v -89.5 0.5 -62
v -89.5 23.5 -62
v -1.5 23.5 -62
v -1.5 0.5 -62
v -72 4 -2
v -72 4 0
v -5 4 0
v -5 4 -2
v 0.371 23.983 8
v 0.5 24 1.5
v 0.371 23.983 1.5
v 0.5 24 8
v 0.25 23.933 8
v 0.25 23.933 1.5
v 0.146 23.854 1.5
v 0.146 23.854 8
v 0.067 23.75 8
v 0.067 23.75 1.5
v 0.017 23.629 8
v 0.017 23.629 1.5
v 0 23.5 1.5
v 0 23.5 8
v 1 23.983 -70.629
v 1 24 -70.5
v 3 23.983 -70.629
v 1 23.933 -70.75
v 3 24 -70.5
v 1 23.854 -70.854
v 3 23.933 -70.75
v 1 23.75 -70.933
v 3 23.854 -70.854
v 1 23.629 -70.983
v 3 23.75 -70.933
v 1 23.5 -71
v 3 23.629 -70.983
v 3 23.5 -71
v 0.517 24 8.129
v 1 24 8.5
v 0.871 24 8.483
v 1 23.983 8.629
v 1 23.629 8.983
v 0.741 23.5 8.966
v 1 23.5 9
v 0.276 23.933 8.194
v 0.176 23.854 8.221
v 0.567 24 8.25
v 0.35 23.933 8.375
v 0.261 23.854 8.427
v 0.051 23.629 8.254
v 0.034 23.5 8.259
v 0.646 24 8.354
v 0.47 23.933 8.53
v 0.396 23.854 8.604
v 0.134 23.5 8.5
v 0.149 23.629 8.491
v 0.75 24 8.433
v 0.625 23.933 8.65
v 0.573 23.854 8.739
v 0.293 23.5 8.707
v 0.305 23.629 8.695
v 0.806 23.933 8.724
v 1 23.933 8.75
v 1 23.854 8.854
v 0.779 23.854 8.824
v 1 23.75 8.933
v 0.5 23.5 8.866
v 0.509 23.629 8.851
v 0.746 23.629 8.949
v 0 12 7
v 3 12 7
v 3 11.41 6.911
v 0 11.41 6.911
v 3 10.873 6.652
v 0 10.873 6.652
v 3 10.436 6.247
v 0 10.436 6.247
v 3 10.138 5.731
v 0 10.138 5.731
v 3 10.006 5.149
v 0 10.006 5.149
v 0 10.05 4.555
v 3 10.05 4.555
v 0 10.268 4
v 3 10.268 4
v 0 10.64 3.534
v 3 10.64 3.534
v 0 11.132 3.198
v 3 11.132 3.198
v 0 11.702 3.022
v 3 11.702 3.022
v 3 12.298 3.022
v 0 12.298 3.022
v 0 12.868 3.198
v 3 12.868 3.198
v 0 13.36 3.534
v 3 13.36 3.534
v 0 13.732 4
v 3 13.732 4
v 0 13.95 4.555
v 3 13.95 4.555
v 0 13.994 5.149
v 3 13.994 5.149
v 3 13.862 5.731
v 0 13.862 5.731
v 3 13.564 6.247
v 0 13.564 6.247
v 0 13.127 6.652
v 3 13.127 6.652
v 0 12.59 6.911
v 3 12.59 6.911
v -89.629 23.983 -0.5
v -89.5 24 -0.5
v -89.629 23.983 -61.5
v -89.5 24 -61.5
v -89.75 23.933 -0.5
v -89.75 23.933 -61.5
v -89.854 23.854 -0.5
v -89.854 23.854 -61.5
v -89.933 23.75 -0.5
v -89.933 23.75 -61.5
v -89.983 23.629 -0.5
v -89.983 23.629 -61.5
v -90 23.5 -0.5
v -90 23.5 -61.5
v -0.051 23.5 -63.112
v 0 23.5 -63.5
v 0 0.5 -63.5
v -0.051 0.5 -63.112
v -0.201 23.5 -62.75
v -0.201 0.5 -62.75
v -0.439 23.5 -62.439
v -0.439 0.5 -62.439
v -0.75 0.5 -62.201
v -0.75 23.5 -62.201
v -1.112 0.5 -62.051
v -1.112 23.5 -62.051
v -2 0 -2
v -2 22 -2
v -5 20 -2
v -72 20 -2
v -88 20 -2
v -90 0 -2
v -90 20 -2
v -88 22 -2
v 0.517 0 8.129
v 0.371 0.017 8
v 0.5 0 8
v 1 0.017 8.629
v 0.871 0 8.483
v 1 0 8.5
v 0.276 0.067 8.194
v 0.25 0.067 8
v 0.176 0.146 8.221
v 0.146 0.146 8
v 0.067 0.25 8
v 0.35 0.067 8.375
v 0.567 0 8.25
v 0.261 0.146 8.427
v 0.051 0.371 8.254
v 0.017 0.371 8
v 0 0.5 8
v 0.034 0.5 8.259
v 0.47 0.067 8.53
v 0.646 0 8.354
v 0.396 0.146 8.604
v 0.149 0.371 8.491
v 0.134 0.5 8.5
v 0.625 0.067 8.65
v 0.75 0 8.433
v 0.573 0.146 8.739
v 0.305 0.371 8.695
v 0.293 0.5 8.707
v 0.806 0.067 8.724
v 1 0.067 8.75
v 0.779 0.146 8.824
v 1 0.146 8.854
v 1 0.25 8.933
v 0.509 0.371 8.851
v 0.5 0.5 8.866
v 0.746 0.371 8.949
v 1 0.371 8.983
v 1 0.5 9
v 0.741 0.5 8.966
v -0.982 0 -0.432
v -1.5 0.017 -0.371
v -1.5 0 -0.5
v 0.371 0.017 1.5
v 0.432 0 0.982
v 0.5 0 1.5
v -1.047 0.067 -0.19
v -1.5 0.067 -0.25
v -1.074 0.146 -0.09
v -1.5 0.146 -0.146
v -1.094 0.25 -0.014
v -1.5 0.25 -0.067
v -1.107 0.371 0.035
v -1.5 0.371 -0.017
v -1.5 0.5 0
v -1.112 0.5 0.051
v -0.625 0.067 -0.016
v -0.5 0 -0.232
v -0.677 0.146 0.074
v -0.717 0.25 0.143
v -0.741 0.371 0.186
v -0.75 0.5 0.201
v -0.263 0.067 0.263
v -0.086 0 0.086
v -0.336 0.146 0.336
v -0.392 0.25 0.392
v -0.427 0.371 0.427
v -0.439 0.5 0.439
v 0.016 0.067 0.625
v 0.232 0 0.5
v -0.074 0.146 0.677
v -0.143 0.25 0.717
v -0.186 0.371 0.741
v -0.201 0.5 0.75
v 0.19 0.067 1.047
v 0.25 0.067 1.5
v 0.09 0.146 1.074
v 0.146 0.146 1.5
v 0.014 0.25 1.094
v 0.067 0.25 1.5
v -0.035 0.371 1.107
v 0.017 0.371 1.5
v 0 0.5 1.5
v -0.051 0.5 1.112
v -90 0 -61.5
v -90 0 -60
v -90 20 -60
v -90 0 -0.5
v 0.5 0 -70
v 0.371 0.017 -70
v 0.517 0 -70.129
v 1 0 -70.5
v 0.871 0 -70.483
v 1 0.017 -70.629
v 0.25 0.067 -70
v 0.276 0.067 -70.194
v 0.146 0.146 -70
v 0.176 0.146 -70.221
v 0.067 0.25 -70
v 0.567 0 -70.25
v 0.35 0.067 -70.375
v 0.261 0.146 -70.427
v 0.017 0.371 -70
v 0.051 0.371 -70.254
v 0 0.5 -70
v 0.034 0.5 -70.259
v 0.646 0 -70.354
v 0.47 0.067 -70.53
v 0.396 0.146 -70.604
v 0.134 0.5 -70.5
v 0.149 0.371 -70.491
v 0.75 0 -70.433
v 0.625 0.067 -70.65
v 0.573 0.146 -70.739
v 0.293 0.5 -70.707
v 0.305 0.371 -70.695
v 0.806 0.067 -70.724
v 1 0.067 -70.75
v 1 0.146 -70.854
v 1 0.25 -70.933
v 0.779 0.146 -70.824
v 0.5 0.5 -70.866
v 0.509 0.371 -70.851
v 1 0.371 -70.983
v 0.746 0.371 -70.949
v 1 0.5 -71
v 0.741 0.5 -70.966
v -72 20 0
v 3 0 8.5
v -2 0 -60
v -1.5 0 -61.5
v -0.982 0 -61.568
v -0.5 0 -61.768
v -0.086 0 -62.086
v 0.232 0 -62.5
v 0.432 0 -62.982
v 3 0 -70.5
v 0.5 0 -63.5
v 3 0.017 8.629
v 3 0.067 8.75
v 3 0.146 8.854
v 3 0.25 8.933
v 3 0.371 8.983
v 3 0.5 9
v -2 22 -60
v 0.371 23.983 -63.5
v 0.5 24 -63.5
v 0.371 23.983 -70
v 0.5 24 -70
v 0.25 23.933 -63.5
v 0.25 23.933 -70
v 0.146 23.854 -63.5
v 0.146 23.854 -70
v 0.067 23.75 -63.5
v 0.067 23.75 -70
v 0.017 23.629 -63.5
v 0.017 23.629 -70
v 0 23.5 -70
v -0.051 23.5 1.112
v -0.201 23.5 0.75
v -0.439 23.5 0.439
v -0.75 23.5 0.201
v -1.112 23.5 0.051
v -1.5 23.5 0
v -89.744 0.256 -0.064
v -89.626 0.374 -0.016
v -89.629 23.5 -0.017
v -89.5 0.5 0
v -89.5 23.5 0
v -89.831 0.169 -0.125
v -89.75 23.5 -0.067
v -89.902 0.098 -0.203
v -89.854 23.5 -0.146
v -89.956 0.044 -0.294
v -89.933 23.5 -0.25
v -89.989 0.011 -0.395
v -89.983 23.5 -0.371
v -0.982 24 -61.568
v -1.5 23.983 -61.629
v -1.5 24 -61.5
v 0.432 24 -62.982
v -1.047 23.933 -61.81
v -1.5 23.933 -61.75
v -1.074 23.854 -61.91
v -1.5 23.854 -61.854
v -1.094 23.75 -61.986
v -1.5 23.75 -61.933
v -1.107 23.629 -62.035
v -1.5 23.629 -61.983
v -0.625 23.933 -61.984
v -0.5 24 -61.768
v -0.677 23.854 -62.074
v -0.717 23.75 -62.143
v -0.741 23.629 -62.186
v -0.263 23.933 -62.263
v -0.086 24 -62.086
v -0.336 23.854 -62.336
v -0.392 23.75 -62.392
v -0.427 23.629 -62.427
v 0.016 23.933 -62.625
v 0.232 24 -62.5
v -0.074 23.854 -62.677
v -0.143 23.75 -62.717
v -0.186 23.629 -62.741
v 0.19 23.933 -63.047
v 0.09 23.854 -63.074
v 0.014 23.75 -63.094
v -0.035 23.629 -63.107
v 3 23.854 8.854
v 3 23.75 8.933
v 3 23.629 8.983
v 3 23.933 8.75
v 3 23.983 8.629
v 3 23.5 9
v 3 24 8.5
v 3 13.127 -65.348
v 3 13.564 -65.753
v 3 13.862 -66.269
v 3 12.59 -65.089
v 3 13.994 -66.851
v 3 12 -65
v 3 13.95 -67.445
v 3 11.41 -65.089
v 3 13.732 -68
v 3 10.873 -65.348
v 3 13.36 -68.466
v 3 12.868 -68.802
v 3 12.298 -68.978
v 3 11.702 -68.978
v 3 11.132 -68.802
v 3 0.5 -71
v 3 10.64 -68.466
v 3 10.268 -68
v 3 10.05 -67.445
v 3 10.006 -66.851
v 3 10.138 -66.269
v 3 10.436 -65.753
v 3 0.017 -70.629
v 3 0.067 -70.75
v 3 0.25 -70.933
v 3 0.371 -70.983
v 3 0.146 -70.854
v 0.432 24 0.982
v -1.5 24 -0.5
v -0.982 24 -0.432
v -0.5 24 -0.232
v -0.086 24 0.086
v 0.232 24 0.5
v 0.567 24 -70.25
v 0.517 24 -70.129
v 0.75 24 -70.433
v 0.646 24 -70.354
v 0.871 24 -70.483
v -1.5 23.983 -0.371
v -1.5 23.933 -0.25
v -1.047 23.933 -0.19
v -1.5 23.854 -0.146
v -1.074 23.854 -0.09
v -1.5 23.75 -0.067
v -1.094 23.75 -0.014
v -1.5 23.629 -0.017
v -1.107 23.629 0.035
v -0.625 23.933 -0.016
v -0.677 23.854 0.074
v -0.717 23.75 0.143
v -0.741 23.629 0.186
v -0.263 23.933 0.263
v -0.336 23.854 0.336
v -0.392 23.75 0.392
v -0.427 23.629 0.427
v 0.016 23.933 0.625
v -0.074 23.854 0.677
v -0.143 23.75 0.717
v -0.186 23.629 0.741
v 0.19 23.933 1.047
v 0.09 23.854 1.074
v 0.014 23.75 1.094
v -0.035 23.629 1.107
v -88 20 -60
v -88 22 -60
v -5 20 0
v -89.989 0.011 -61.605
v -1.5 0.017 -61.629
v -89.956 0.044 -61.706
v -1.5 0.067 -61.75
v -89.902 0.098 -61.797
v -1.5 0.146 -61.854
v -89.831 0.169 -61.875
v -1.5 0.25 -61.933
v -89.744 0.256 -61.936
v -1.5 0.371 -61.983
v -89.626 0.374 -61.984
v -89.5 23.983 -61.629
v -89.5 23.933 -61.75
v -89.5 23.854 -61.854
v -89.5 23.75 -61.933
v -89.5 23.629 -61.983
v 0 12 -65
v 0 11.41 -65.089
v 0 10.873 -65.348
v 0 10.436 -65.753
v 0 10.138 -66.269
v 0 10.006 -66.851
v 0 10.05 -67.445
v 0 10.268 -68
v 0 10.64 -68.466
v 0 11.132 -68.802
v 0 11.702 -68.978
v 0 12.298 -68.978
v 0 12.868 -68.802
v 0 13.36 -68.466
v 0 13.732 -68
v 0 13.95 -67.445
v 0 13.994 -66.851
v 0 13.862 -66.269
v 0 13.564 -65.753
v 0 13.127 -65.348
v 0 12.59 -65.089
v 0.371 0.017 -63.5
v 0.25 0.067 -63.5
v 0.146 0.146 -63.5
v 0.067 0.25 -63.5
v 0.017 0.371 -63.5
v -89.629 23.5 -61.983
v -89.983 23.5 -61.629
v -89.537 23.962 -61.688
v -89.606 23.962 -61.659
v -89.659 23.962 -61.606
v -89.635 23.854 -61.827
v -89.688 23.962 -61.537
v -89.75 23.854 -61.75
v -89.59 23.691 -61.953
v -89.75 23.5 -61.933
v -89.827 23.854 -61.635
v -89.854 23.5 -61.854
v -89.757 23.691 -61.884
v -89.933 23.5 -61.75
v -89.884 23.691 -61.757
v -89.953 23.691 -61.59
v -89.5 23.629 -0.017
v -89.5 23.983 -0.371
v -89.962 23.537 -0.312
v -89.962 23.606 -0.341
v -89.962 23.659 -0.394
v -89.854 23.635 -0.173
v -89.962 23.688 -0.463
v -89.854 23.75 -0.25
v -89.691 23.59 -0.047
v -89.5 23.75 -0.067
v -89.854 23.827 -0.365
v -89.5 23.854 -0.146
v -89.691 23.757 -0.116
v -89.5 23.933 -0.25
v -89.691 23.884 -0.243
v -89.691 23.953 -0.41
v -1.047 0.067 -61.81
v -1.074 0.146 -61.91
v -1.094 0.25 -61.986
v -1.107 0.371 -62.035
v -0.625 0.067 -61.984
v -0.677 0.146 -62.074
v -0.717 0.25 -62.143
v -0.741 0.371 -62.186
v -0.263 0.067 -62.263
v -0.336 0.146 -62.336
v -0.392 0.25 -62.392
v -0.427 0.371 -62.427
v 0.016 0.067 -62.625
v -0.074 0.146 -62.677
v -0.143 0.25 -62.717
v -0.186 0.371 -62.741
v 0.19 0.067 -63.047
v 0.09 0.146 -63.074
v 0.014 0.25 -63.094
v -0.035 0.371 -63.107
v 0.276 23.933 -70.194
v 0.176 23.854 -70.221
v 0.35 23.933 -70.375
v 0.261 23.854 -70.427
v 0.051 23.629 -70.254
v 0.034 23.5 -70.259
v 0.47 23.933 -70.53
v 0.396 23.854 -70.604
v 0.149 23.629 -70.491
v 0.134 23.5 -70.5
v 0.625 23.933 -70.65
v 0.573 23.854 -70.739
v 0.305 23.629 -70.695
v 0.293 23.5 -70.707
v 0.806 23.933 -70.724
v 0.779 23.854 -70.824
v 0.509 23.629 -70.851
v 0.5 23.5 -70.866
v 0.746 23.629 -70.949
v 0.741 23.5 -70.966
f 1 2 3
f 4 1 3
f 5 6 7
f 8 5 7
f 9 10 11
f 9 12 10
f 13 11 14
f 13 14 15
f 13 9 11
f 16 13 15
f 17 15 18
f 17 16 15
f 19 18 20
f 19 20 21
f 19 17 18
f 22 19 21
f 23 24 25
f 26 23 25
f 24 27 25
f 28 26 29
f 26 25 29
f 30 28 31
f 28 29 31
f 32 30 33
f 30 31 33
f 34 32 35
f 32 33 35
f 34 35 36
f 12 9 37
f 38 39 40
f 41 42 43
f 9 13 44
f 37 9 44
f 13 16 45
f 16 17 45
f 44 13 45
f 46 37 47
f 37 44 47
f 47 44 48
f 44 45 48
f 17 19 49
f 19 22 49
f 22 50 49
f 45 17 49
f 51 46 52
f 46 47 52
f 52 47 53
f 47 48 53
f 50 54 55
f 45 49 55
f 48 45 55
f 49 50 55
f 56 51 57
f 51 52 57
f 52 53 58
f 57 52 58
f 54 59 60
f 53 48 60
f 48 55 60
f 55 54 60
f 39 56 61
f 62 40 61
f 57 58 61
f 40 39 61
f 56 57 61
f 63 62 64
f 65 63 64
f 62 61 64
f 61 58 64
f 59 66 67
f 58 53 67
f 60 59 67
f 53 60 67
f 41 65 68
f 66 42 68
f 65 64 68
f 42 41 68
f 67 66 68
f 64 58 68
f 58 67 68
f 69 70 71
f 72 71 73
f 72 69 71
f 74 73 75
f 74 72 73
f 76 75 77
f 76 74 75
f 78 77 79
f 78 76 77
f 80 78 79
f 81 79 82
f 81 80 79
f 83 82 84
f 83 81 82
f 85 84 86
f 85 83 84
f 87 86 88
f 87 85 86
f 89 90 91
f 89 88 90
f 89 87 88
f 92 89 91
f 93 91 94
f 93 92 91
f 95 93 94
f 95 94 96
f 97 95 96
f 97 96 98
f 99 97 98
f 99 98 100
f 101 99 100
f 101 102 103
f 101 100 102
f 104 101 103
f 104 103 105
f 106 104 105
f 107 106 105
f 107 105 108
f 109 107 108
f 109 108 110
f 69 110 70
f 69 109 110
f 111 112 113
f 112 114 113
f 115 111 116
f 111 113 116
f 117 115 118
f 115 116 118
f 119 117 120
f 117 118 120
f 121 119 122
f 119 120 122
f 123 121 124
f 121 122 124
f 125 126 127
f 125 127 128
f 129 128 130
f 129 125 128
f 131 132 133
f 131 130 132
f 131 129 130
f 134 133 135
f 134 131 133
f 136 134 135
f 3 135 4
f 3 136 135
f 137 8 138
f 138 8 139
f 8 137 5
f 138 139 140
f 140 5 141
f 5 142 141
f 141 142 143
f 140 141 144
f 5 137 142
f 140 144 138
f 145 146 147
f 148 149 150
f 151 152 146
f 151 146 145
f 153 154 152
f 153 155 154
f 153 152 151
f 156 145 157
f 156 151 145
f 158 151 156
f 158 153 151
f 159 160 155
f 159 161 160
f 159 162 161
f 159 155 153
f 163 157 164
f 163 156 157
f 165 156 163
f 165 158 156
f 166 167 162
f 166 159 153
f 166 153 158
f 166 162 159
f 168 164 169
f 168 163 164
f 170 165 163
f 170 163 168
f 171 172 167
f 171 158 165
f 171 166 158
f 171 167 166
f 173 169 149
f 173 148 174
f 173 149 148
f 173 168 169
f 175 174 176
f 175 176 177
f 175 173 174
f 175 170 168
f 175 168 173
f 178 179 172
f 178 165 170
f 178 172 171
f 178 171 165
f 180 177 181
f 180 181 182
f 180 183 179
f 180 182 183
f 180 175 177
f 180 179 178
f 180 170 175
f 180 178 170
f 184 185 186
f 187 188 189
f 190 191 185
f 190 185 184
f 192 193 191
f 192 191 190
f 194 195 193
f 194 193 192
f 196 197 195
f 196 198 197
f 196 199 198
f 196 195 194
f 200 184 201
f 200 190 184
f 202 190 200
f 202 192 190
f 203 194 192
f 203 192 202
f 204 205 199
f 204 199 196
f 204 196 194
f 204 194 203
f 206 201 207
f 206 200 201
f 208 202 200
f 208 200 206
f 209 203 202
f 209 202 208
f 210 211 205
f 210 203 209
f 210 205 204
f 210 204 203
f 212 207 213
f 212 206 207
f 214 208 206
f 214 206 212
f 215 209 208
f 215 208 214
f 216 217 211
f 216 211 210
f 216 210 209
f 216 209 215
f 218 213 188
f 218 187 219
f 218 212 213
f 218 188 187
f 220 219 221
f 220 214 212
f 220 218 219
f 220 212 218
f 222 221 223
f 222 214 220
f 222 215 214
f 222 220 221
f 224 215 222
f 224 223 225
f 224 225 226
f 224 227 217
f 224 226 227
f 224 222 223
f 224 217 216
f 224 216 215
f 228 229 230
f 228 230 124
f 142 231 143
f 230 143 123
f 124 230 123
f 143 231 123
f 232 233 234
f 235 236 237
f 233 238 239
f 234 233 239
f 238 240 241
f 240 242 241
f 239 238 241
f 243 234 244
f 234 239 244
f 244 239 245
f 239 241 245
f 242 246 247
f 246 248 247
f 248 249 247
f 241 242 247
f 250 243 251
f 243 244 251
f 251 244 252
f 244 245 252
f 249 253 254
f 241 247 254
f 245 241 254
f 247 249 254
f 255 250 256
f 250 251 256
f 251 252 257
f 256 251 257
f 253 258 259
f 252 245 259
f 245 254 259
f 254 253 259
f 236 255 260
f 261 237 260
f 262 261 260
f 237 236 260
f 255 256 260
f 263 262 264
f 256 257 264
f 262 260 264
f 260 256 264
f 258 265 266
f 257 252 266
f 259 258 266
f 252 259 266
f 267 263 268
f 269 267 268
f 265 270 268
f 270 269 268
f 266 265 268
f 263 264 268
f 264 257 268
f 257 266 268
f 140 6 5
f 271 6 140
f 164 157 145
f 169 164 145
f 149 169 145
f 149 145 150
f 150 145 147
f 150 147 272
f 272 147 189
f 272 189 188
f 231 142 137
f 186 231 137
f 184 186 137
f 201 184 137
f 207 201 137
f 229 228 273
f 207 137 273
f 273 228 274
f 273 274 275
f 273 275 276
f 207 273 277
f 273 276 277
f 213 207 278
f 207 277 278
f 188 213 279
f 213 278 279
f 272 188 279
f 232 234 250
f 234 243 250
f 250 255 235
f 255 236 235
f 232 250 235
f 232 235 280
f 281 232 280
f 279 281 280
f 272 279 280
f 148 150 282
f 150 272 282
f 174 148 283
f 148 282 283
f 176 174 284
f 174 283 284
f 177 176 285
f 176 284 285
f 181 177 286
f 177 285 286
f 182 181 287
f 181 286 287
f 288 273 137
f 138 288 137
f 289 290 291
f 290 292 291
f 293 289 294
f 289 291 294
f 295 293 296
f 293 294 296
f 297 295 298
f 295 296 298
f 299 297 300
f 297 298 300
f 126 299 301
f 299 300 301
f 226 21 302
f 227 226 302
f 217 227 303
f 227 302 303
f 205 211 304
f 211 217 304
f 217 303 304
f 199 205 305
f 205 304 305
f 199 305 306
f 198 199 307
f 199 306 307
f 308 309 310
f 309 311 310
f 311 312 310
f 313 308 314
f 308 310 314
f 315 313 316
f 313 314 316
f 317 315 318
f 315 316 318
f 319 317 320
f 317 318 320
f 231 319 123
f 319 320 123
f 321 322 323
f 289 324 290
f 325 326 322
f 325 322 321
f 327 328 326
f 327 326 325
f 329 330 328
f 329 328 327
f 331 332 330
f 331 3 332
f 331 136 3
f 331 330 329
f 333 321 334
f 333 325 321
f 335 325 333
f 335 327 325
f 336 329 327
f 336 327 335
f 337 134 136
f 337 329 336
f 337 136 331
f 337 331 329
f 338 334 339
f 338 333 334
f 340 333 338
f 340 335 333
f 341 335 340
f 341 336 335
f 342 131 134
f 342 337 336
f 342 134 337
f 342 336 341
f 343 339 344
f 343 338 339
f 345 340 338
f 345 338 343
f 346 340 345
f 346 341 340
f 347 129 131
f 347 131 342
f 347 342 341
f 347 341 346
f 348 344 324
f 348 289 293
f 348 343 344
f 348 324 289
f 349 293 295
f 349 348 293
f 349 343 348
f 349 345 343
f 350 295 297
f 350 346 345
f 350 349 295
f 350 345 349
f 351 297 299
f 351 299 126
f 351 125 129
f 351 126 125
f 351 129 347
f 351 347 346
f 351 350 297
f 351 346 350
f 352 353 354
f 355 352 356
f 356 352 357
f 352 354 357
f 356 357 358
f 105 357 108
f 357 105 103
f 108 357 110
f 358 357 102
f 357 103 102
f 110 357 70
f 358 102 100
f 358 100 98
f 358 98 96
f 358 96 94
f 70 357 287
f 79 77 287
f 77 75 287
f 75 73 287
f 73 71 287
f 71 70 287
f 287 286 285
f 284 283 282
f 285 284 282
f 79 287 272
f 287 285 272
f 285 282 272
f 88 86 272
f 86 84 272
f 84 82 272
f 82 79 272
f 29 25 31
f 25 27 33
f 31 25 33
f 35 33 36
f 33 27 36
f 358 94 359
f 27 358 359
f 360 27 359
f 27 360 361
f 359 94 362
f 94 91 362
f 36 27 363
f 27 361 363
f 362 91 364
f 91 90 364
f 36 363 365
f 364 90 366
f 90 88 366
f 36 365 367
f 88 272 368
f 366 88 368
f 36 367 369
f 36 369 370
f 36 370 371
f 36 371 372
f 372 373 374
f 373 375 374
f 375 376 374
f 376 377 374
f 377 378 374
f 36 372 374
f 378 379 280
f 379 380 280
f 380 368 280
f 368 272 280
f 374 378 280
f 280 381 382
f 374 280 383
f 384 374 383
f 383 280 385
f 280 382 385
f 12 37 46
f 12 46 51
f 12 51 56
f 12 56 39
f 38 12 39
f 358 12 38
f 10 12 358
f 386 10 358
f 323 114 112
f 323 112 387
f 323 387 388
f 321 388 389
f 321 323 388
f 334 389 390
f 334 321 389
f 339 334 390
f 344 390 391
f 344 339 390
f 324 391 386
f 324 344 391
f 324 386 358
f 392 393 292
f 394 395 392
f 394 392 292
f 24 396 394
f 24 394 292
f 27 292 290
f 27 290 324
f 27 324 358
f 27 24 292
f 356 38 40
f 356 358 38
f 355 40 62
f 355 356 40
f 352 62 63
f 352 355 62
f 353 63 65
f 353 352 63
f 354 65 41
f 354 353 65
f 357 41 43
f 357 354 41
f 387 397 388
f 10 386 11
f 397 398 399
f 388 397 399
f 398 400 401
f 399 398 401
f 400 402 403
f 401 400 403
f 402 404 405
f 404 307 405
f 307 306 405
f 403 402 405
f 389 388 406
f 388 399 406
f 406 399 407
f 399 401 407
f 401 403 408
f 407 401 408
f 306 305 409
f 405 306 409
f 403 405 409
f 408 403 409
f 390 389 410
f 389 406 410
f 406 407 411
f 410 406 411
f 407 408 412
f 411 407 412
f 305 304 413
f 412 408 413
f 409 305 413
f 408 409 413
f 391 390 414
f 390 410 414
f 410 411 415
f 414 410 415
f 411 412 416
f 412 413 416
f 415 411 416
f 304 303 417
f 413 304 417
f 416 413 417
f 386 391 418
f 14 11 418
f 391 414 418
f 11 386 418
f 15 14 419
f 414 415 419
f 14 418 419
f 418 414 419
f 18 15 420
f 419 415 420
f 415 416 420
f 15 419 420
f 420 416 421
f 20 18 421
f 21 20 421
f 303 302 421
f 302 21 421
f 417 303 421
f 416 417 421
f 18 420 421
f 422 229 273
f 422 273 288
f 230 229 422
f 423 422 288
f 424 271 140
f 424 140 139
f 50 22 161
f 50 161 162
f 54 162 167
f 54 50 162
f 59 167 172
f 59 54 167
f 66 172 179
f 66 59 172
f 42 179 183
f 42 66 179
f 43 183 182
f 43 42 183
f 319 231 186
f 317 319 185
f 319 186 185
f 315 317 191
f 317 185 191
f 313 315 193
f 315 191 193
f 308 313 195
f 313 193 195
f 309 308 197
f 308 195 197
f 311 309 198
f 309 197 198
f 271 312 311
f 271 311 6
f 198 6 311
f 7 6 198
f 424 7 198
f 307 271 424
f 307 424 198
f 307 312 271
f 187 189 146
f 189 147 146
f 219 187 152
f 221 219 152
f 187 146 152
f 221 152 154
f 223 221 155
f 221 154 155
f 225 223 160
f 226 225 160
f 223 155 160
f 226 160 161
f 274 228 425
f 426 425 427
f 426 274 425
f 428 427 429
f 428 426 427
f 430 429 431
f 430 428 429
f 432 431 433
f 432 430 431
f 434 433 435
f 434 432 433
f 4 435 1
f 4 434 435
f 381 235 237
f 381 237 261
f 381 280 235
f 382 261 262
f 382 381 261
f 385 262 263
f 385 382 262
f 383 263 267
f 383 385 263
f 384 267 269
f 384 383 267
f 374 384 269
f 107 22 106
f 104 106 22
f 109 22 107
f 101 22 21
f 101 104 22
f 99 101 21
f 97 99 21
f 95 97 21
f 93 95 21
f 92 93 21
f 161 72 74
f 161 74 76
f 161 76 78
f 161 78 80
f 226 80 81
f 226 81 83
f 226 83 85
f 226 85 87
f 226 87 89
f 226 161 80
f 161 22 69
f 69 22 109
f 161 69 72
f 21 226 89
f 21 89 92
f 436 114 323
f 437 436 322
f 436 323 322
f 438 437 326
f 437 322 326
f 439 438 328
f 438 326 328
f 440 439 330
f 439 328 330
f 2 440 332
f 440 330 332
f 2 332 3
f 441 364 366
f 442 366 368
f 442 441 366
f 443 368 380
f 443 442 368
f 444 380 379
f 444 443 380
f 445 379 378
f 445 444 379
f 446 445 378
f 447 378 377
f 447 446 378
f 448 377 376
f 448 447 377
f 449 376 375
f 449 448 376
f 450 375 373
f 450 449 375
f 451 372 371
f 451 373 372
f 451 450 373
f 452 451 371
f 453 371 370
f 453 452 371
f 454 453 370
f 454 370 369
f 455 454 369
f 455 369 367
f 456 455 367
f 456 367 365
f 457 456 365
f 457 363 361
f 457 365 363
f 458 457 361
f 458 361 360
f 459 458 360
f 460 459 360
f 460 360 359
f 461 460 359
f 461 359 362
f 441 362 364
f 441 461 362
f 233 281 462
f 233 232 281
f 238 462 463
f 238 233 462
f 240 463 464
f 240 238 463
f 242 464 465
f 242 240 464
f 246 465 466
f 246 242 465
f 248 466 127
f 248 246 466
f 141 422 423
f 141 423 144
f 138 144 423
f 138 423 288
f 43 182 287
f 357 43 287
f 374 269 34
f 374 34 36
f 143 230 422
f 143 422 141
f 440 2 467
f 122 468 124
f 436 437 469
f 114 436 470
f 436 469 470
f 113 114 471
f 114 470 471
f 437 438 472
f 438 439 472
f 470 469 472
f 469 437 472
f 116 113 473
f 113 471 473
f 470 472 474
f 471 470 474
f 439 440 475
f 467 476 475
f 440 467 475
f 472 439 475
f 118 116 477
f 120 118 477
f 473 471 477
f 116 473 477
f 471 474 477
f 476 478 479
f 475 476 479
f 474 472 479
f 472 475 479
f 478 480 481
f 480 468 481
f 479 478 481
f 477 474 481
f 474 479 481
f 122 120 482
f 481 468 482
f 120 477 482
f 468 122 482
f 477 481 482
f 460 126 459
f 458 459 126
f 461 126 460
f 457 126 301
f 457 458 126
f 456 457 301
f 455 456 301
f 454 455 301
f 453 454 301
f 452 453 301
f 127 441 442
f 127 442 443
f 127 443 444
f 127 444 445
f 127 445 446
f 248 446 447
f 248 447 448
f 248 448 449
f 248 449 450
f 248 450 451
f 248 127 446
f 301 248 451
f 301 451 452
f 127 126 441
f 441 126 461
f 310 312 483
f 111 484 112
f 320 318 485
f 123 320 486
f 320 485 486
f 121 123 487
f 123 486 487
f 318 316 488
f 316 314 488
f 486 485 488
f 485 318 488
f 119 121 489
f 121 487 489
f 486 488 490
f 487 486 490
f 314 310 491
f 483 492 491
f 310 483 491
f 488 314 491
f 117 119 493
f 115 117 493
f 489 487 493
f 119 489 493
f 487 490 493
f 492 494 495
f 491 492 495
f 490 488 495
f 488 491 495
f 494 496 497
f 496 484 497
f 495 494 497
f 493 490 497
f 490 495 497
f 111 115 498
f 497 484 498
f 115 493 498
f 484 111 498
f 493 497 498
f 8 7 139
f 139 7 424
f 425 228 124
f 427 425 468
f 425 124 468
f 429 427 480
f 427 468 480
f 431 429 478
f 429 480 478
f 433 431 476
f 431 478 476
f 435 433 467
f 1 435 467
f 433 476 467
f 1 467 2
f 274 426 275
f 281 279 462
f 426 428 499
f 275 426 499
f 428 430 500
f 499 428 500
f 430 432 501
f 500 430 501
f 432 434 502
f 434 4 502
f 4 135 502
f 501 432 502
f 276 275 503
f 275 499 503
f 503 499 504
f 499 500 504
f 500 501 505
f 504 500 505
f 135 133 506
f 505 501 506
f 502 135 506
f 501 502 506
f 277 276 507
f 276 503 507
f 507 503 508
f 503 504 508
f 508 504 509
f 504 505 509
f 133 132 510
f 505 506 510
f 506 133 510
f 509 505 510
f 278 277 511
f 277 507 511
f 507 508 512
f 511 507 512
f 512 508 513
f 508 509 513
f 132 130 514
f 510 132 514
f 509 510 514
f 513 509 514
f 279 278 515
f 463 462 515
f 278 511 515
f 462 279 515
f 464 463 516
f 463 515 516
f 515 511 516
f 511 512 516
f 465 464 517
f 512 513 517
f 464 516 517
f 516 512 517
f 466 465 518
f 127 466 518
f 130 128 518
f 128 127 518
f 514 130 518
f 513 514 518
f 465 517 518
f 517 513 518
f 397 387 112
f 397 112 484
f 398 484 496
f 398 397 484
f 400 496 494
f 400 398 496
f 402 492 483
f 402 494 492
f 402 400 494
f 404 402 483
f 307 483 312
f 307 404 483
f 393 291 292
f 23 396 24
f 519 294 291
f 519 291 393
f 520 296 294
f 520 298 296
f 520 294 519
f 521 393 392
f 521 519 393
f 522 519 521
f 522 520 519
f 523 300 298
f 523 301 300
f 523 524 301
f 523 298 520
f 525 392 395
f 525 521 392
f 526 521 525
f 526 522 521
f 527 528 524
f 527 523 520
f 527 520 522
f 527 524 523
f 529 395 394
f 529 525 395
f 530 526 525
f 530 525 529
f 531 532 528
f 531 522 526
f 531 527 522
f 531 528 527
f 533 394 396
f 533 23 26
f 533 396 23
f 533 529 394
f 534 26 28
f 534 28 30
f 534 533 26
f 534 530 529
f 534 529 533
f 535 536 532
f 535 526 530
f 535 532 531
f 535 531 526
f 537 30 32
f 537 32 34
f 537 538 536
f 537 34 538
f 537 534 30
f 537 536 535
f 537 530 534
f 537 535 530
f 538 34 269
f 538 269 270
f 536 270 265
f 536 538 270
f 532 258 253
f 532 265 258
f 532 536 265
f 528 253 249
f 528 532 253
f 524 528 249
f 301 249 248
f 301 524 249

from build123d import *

# Parameters (mm, degrees)
SKIZZE1_W                       = 90
SKIZZE1_H                       = 24
AUFSATZ_LINEAR_AUSTRAGEN1_DEPTH = 62
SKIZZE2_W                       = 86
SKIZZE2_H                       = 58
SCHNITT_LINEAR_AUSTRAGEN1_DEPTH = 22
SKIZZE3_W                       = 58
SKIZZE3_H                       = 20
SCHNITT_LINEAR_AUSTRAGEN2_DEPTH = 5
SKIZZE4_W                       = 67
SKIZZE4_H                       = 16
SCHNITT_LINEAR_AUSTRAGEN3_DEPTH = 50
SKIZZE6_W                       = 3
SKIZZE6_H                       = 80
AUFSATZ_LINEAR_AUSTRAGEN2_DEPTH = 24
SKIZZE5_R                       = 2
SCHNITT_LINEAR_AUSTRAGEN6_DEPTH = 24
VERRUNDUNG1_R                   = 1.5
VERRUNDUNG2_R                   = 1
VERRUNDUNG3_R                   = 0.5


with BuildPart() as part:
    # Skizze1 → Aufsatz-Linear austragen1 (new body)
    with BuildSketch(Plane.XY):
        with Locations((-45, 12)):
            Rectangle(SKIZZE1_W, SKIZZE1_H)
    extrude(amount=-AUFSATZ_LINEAR_AUSTRAGEN1_DEPTH)

    # Skizze2 → Schnitt-Linear austragen1 (cut)
    with BuildSketch(Plane.XZ):
        with Locations((-45, -31)):
            Rectangle(SKIZZE2_W, SKIZZE2_H)
    extrude(amount=-SCHNITT_LINEAR_AUSTRAGEN1_DEPTH, mode=Mode.SUBTRACT)

    # Skizze3 → Schnitt-Linear austragen2 (cut)
    with BuildSketch(Plane.ZY.offset(90)):
        with Locations((-31, 10)):
            Rectangle(SKIZZE3_W, SKIZZE3_H)
    extrude(amount=-SCHNITT_LINEAR_AUSTRAGEN2_DEPTH, mode=Mode.SUBTRACT)

    # Skizze4 → Schnitt-Linear austragen3 (cut)
    with BuildSketch(Plane.XY):
        with Locations((-38.5, 12)):
            Rectangle(SKIZZE4_W, SKIZZE4_H)
    extrude(amount=-SCHNITT_LINEAR_AUSTRAGEN3_DEPTH, mode=Mode.SUBTRACT)

    # Skizze6 → Aufsatz-Linear austragen2 (add)
    with BuildSketch(Plane(origin=(0, 0, 0), x_dir=(1, 0, 0), z_dir=(0, 1, 0))):
        with Locations((1.5, 31)):
            Rectangle(SKIZZE6_W, SKIZZE6_H)
    extrude(amount=AUFSATZ_LINEAR_AUSTRAGEN2_DEPTH)

    # Skizze5 → Schnitt-Linear austragen6 (cut)
    with BuildSketch(Plane(origin=(0, 0, 0), x_dir=(0, 0, -1), z_dir=(1, 0, 0))):
        with Locations(Location((67, 12, 0), (0, 0, 180))):
            Circle(SKIZZE5_R)
        with Locations(Location((-5, 12, 0), (0, 0, 180))):
            Circle(SKIZZE5_R)
    extrude(amount=SCHNITT_LINEAR_AUSTRAGEN6_DEPTH, mode=Mode.SUBTRACT)

    # Verrundung1
    verrundung1_edges = [part.edges().sort_by_distance(p)[0] for p in [
        (0, 12, -62),
        (0, 12, 0),
    ]]
    fillet(verrundung1_edges, radius=VERRUNDUNG1_R)

    # Verrundung2
    verrundung2_edges = [part.edges().sort_by_distance(p)[0] for p in [
        (0, 12, -71),
        (0, 12, 9),
    ]]
    fillet(verrundung2_edges, radius=VERRUNDUNG2_R)

    # Verrundung3
    verrundung3_edges = [part.edges().sort_by_distance(p)[0] for p in [
        (-90, 12, -62),
        (-45.75, 0, -62),
        (0, 0, -66.75),
        (0, 24, -66.75),
        (2, 0, 9),
        (0.292893219, 0, 8.707106781),
        (0.292893219, 0, -70.707106781),
        (2, 24, 9),
        (0.292893219, 24, 8.707106781),
        (0.292893219, 24, -70.707106781),
        (-45.75, 0, 0),
        (-90, 12, 0),
        (2, 0, -71),
        (2, 24, -71),
        (-90, 24, -31),
        (-45.75, 24, 0),
        (0, 0, 4.75),
        (0, 24, 4.75),
        (-45.75, 24, -62),
        (-0.439339828, 24, 0.439339828),
        (-0.439339828, 0, 0.439339828),
        (-0.439339828, 24, -62.439339828),
        (-0.439339828, 0, -62.439339828),
    ]]
    fillet(verrundung3_edges, radius=VERRUNDUNG3_R)


solid = part.part
